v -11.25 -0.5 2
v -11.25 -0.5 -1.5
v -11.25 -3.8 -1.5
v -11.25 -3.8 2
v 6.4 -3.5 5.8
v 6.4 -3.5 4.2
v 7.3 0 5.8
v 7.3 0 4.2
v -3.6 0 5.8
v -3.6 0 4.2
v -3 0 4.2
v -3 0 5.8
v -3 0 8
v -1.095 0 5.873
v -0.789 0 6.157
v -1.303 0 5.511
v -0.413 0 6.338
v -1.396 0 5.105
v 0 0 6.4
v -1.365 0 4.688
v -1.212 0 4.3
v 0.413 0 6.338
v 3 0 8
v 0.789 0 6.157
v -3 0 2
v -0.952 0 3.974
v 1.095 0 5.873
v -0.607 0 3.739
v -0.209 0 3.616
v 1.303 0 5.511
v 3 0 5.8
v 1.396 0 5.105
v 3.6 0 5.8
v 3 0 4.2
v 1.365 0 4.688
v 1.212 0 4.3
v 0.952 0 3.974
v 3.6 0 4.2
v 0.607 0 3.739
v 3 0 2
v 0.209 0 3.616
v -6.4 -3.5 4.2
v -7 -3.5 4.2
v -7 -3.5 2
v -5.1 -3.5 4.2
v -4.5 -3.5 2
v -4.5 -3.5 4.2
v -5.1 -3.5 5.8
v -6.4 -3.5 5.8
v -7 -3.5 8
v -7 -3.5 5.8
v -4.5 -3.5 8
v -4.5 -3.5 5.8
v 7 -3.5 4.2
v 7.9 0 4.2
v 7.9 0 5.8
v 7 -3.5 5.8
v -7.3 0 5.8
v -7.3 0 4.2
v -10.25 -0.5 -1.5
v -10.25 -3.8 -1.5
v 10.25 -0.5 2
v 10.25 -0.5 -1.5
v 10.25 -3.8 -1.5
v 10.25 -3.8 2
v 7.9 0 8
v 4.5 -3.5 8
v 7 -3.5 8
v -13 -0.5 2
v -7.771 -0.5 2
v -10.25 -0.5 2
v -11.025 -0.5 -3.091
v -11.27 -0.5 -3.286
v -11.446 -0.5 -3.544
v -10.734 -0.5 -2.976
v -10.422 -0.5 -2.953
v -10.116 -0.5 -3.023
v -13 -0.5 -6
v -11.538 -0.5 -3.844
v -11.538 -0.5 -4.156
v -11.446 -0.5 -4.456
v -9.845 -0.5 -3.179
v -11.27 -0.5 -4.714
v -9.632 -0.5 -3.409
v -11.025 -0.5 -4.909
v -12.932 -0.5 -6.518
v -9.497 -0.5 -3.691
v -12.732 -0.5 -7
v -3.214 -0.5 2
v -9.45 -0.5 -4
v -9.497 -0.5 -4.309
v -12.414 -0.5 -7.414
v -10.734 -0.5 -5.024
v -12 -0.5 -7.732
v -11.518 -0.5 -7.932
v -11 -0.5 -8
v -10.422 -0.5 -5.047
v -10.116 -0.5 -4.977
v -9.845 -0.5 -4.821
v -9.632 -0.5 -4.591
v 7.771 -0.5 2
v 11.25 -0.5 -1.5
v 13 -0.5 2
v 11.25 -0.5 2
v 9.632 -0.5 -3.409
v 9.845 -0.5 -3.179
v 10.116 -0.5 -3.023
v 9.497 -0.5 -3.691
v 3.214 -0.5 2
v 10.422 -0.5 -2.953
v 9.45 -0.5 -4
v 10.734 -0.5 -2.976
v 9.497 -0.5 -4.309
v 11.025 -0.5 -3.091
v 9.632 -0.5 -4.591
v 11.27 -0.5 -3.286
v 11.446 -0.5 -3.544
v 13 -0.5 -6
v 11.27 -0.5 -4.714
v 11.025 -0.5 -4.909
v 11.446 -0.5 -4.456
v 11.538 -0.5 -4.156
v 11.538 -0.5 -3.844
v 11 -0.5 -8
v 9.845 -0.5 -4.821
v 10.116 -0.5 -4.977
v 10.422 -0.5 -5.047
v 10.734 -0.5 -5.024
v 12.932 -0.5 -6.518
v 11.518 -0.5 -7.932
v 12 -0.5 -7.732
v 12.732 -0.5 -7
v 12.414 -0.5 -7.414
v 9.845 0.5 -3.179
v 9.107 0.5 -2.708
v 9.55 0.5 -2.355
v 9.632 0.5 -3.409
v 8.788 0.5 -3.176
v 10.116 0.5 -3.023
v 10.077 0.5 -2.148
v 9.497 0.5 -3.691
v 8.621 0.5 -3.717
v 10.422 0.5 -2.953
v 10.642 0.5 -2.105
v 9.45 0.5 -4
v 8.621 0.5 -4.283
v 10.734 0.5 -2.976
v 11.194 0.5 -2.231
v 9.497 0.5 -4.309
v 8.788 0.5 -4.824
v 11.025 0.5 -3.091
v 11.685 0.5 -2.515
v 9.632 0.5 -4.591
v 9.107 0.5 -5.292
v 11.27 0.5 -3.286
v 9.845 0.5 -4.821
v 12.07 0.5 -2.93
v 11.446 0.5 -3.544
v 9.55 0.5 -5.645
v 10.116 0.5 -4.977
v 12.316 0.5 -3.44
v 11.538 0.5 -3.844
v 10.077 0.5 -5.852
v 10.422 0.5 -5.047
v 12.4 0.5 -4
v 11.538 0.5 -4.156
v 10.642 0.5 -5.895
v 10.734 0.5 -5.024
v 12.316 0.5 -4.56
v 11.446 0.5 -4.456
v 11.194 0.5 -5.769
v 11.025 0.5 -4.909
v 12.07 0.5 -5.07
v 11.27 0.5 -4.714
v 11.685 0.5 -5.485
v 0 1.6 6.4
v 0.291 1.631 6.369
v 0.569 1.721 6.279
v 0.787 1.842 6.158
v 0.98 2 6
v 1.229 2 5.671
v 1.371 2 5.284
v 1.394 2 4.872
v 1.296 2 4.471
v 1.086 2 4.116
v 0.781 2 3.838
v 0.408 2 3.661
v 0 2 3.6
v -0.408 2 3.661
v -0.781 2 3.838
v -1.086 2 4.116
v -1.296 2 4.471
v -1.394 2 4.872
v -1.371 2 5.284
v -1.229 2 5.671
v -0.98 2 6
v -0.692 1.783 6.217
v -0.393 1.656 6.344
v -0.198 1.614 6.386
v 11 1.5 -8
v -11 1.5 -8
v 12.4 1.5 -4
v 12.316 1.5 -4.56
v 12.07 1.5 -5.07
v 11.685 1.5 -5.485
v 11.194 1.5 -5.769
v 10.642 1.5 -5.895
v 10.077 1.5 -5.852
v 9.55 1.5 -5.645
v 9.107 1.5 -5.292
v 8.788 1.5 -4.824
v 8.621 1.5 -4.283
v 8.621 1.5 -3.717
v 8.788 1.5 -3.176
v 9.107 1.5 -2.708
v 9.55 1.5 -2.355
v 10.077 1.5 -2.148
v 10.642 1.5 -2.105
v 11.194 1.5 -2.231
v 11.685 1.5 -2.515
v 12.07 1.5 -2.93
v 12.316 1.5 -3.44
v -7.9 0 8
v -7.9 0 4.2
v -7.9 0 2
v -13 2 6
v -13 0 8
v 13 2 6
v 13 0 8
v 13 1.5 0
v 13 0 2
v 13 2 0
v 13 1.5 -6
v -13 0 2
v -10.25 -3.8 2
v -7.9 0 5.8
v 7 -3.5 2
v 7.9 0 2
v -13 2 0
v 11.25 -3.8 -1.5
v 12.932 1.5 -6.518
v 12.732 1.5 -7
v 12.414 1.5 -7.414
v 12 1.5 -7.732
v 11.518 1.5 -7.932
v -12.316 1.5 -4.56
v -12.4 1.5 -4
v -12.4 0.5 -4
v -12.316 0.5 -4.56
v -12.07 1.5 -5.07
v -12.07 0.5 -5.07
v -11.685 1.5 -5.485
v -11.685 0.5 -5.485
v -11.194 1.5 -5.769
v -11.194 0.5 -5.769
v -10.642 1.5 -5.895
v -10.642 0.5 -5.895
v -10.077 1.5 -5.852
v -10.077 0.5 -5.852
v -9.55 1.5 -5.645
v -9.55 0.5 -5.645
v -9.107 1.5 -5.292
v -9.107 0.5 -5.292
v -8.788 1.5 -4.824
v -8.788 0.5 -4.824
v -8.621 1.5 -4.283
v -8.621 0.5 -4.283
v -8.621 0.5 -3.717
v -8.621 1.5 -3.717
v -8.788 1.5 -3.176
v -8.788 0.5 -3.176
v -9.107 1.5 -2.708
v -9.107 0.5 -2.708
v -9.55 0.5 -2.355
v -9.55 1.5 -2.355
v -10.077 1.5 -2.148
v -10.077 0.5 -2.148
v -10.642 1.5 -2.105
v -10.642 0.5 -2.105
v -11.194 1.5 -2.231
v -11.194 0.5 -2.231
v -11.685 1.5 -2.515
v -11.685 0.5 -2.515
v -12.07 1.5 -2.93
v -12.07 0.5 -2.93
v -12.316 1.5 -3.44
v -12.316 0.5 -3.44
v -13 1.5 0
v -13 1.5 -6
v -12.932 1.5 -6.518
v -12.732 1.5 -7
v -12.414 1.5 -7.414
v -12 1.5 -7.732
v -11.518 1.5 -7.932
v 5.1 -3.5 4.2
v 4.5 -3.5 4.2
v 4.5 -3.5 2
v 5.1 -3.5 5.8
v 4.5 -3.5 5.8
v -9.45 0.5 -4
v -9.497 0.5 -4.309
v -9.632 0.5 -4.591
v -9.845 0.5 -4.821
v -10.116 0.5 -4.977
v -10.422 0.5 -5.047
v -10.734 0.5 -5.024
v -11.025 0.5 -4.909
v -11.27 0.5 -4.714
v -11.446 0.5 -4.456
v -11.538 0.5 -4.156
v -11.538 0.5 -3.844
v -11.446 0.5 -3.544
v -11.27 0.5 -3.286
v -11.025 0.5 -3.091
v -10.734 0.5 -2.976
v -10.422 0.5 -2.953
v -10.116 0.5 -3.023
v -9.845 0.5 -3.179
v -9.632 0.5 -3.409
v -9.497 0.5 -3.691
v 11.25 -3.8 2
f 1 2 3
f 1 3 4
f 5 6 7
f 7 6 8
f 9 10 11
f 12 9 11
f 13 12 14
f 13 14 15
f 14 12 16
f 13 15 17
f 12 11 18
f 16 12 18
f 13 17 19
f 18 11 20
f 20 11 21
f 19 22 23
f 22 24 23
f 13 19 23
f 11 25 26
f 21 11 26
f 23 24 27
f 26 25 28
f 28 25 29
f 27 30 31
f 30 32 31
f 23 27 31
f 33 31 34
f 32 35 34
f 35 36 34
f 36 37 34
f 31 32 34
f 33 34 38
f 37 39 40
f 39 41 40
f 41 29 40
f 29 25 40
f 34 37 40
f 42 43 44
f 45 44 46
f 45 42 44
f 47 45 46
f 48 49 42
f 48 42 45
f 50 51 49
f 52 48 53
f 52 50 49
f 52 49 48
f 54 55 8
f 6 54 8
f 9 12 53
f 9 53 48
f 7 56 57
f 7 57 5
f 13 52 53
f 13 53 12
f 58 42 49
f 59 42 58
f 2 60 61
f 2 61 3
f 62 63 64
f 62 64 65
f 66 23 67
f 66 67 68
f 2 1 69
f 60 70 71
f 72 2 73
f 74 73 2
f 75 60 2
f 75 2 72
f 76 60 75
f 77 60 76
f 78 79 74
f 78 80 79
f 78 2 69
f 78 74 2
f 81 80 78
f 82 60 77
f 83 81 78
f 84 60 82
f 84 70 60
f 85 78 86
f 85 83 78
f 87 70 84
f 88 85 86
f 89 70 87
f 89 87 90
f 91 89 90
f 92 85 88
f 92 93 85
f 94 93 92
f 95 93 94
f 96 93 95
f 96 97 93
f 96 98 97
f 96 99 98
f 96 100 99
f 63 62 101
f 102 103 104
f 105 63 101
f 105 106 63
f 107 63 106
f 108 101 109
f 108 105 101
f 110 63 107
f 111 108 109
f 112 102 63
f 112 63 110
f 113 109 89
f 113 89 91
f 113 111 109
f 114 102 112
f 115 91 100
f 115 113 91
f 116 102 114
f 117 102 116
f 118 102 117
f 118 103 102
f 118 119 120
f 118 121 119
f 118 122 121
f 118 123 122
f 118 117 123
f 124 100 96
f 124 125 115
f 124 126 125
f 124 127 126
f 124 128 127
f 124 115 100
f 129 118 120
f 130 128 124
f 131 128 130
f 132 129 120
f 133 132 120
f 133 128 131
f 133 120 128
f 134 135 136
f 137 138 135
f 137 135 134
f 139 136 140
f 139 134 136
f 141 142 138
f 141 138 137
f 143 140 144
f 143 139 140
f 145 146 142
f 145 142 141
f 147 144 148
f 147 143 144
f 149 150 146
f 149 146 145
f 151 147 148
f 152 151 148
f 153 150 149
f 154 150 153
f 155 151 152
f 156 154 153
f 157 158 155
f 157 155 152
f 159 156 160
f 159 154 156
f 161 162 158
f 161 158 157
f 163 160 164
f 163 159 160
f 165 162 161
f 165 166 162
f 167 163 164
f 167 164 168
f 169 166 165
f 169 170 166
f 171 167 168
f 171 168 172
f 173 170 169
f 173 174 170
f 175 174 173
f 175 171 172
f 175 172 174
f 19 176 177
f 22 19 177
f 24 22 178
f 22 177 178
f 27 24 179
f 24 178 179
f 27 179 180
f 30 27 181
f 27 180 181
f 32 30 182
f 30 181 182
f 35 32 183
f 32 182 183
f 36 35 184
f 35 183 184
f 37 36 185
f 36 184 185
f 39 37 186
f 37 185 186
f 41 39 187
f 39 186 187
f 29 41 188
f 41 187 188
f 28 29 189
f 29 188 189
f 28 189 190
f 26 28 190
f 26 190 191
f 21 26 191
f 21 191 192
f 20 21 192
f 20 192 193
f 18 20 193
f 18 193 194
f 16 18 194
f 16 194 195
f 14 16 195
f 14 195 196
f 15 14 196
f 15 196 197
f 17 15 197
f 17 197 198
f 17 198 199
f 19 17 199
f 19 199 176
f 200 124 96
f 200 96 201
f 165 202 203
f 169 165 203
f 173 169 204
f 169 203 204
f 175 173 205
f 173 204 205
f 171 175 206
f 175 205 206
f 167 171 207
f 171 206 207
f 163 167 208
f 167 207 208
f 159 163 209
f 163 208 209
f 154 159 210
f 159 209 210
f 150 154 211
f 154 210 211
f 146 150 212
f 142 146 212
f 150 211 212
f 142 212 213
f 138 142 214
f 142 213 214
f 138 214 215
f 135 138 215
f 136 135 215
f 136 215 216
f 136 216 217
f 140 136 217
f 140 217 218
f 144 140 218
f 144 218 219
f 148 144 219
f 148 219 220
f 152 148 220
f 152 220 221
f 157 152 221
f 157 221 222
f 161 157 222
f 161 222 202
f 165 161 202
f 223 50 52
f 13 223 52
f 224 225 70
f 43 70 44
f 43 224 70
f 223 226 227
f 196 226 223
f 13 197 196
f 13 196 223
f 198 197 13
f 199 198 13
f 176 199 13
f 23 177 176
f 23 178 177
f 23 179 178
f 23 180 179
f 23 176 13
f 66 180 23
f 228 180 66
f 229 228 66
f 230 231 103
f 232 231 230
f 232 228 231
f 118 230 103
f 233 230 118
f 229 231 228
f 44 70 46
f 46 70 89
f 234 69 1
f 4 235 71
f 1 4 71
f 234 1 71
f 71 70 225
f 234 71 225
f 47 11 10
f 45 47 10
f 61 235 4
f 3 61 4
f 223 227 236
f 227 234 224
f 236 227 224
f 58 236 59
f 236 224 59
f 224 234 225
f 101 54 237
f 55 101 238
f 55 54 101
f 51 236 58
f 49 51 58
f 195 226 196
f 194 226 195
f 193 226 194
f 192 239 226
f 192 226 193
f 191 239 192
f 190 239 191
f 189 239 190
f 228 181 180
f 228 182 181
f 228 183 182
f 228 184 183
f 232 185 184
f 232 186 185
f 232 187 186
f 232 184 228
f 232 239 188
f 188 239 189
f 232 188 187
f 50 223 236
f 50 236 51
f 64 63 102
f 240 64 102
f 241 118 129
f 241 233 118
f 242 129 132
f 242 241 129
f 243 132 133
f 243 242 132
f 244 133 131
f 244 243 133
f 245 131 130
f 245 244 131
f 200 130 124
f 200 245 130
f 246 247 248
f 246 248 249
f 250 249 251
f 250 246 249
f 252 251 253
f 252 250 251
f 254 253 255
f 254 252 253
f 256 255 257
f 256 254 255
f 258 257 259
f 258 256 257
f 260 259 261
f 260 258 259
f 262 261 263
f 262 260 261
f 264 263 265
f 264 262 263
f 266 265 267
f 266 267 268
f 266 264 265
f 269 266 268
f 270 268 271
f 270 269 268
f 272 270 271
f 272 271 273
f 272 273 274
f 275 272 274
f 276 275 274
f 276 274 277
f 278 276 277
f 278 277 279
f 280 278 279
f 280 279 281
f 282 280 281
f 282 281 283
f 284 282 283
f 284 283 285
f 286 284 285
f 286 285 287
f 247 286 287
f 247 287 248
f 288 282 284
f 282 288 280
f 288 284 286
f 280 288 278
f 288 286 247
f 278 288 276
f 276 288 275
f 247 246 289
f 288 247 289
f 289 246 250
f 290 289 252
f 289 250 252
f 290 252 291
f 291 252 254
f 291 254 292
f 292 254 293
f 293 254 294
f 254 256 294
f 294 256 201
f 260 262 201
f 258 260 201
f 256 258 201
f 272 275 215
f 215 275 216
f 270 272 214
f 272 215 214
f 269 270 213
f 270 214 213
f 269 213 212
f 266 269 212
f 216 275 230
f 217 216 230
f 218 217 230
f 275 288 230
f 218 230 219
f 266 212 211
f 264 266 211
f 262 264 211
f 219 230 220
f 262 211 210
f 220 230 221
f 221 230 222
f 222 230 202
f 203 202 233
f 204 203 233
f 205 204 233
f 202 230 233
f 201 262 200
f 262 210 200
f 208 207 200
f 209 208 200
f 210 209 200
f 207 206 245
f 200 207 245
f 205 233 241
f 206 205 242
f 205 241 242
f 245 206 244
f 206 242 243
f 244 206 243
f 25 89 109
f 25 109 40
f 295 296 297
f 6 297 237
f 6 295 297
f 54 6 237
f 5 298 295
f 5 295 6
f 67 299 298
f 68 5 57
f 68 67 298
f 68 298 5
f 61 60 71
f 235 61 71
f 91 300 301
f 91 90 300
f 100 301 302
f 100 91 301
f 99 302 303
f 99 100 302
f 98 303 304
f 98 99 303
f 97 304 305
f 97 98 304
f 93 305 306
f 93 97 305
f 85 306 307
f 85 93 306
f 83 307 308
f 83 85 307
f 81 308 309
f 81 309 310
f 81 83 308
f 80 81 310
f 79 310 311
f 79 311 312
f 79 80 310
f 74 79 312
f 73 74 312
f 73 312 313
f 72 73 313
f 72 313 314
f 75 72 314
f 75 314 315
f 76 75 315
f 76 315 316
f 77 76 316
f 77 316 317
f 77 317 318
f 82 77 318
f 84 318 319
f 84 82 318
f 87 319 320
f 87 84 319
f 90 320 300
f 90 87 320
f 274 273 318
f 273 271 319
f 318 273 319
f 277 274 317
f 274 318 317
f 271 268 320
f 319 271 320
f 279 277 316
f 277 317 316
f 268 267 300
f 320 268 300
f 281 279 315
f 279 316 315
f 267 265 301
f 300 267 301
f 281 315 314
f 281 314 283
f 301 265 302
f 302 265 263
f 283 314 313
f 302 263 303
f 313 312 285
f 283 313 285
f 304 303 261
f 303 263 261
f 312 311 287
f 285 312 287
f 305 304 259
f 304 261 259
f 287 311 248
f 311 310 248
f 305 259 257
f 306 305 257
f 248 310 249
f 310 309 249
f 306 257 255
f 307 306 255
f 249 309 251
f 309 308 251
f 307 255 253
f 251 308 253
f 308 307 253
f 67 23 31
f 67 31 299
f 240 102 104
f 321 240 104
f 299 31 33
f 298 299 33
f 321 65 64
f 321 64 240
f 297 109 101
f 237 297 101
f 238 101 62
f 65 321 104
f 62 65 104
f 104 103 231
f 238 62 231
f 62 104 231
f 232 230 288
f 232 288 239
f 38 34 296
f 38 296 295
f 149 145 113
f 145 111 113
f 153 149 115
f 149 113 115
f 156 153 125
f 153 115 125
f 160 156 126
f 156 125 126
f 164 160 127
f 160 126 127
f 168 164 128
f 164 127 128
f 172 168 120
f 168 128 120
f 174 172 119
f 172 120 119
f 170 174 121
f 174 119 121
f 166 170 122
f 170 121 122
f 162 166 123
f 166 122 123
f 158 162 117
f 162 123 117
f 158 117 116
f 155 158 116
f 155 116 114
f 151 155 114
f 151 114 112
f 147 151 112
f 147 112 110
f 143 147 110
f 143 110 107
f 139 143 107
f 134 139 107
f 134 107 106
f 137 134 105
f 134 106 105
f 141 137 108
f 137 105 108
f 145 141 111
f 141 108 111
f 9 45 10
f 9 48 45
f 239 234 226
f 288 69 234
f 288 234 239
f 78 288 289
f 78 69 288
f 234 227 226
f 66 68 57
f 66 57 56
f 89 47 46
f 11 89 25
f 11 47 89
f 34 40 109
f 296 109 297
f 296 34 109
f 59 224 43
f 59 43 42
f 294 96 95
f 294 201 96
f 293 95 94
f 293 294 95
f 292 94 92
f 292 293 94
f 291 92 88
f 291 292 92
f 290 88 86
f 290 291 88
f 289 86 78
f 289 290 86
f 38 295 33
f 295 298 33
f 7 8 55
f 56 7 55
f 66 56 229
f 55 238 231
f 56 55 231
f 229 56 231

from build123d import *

# Parameters (mm, degrees)
SKETCH_1_W                   = 26
SKETCH_1_H                   = 16
EXTRUDE_1_DEPTH              = 2
EXTRUDE_3_DEPTH              = 6
CUT_EXTRUDE_1_REACH          = 18.225
SKETCH_5_R                   = 1.4
EXTRUDE_4_REACH              = 29.427
SKETCH_6_W                   = 10
SKETCH_6_H                   = 0.5
CUT_EXTRUDE_2_REACH          = 29.427
SKETCH_7_W                   = 8
SKETCH_7_H                   = 0.5
HOLE_WIZARD_M2_1_D           = 2.1
HOLE_WIZARD_M2_1_CBORE_D     = 3.8
HOLE_WIZARD_M2_1_CBORE_DEPTH = 1
SKETCH_10_W                  = 1
SKETCH_10_H                  = 3.5
EXTRUDE_5_DEPTH              = 3.3
CHAMFER_1_SIZE               = 2
FILLET_2_R                   = 2
CUT_EXTRUDE_3_DEPTH          = 0.8


with BuildPart() as part:
    # ｽｹｯﾁ1 → ﾎﾞｽ - 押し出し1 (new body)
    with BuildSketch(Plane(origin=(0, 0, 0), x_dir=(1, 0, 0), z_dir=(0, 1, 0))):
        Rectangle(SKETCH_1_W, SKETCH_1_H)
    extrude(amount=EXTRUDE_1_DEPTH)

    # ｽｹｯﾁ4 → ﾎﾞｽ - 押し出し3 (add)
    with BuildSketch(Plane.XY.offset(8)):
        Polygon((-7, -3.5), (-4.5, -3.5), (-3, 0), (-7.9, 0), align=None)
        Polygon((3, 0), (4.5, -3.5), (7, -3.5), (7.9, 0), align=None)
    extrude(amount=-EXTRUDE_3_DEPTH)

    # ｽｹｯﾁ5 → ｶｯﾄ - 押し出し1 (cut, up to next)
    with BuildSketch(Plane(origin=(0, 2, 0), x_dir=(1, 0, 0), z_dir=(0, 1, 0)), mode=Mode.PRIVATE) as cut_extrude_1_sk1:
        with Locations(Location((0, -5, 0), (0, 0, 270))):
            Circle(SKETCH_5_R)
    cut_extrude_1_tool1 = extrude(cut_extrude_1_sk1.sketch, amount=-CUT_EXTRUDE_1_REACH, mode=Mode.PRIVATE) & part.part
    add(cut_extrude_1_tool1.solids().sort_by_distance((0, 2, 5))[0], mode=Mode.SUBTRACT)

    # ﾎﾞｽ - 押し出し4: up to this face of the body (flat: up to its plane)
    extrude_4_end = Plane(part.part.faces().sort_by_distance((-13, 1, 0))[0])
    # ｽｹｯﾁ6 → ﾎﾞｽ - 押し出し4 (add, up to the picked face)
    with BuildSketch(Plane(origin=(13, 0, 0), x_dir=(0, 0, -1), z_dir=(1, 0, 0)), mode=Mode.PRIVATE) as extrude_4_sk1:
        with Locations((3, -0.25)):
            Rectangle(SKETCH_6_W, SKETCH_6_H)
    extrude_4_tool1 = split(extrude(extrude_4_sk1.sketch, amount=-EXTRUDE_4_REACH, mode=Mode.PRIVATE), bisect_by=extrude_4_end, keep=Keep.BOTH, mode=Mode.PRIVATE)
    add(extrude_4_tool1.solids().sort_by(Axis((13, -0.25, -3), (-1, 0, 0)))[0])

    # ｽｹｯﾁ7 → ｶｯﾄ - 押し出し2 (cut, up to next)
    with BuildSketch(Plane(origin=(13, 0, 0), x_dir=(0, 0, -1), z_dir=(1, 0, 0)), mode=Mode.PRIVATE) as cut_extrude_2_sk1:
        with Locations((4, 1.75)):
            Rectangle(SKETCH_7_W, SKETCH_7_H)
    cut_extrude_2_tool1 = extrude(cut_extrude_2_sk1.sketch, amount=-CUT_EXTRUDE_2_REACH, mode=Mode.PRIVATE) & part.part
    add(cut_extrude_2_tool1.solids().sort_by_distance((13, 1.75, -4))[0], mode=Mode.SUBTRACT)

    # M2 丸平ねじ用座ぐり穴1 (through all)
    with Locations(Plane(origin=(0, 1.5, 0), x_dir=(1, 0, 0), z_dir=(0, 1, 0))):
        with Locations((10.5, 4)):
            hole_wizard_m2_1 = CounterBoreHole(HOLE_WIZARD_M2_1_D / 2, HOLE_WIZARD_M2_1_CBORE_D / 2, HOLE_WIZARD_M2_1_CBORE_DEPTH)

    # ｽｹｯﾁ10 → ﾎﾞｽ - 押し出し5 (add)
    with BuildSketch(Plane.XZ.offset(0.5)):
        with Locations((10.75, 0.25)):
            Rectangle(SKETCH_10_W, SKETCH_10_H)
    extrude_5 = extrude(amount=EXTRUDE_5_DEPTH)

    # ﾐﾗｰ1: M2 丸平ねじ用座ぐり穴1, ﾎﾞｽ - 押し出し5 across plane
    add(hole_wizard_m2_1.mirror(Plane(origin=(0, 0, 0), x_dir=(0, 0, 1), z_dir=(1, 0, 0))), mode=Mode.SUBTRACT)
    add(extrude_5.mirror(Plane(origin=(0, 0, 0), x_dir=(0, 0, 1), z_dir=(1, 0, 0))))

    # 面取り1
    # the kernel refuses this chamfer: 2 mm, written as the material it takes off along each edge
    with BuildSketch(Plane(origin=(18.143365976, 2, 8), x_dir=(0, 0.02749587661058627, -0.9996219169112968), z_dir=(-1, 0, 0))) as chamfer_1_piece_1:
        Polygon((CHAMFER_1_SIZE * 0.999621916911, CHAMFER_1_SIZE * 0.0274958766106), (-CHAMFER_1_SIZE * 0.0274958766106, CHAMFER_1_SIZE * 0.999621916911), (0, 0), align=None)
    extrude(amount=36.286731952, mode=Mode.SUBTRACT)

    # ﾌｨﾚｯﾄ2
    fillet_2_edges = [part.edges().sort_by_distance(p)[0] for p in [
        (13, 0.5, -8),
        (-13, 0.5, -8),
    ]]
    fillet(fillet_2_edges, radius=FILLET_2_R)

    # ｽｹｯﾁ12 → ｶｯﾄ - 押し出し3 (cut, symmetric)
    with BuildSketch(Plane.XY.offset(5)):
        Polygon((-7.9, 0), (-7, -3.5), (-6.4, -3.5), (-7.3, 0), align=None)
        Polygon((-3, 0), (-4.5, -3.5), (-5.1, -3.5), (-3.6, 0), align=None)
    cut_extrude_3 = extrude(amount=CUT_EXTRUDE_3_DEPTH, both=True, mode=Mode.SUBTRACT)

    # ﾐﾗｰ2: ｶｯﾄ - 押し出し3 across plane
    add(cut_extrude_3.mirror(Plane(origin=(0, 0, 0), x_dir=(0, 0, 1), z_dir=(1, 0, 0))), mode=Mode.SUBTRACT)


solid = part.part
